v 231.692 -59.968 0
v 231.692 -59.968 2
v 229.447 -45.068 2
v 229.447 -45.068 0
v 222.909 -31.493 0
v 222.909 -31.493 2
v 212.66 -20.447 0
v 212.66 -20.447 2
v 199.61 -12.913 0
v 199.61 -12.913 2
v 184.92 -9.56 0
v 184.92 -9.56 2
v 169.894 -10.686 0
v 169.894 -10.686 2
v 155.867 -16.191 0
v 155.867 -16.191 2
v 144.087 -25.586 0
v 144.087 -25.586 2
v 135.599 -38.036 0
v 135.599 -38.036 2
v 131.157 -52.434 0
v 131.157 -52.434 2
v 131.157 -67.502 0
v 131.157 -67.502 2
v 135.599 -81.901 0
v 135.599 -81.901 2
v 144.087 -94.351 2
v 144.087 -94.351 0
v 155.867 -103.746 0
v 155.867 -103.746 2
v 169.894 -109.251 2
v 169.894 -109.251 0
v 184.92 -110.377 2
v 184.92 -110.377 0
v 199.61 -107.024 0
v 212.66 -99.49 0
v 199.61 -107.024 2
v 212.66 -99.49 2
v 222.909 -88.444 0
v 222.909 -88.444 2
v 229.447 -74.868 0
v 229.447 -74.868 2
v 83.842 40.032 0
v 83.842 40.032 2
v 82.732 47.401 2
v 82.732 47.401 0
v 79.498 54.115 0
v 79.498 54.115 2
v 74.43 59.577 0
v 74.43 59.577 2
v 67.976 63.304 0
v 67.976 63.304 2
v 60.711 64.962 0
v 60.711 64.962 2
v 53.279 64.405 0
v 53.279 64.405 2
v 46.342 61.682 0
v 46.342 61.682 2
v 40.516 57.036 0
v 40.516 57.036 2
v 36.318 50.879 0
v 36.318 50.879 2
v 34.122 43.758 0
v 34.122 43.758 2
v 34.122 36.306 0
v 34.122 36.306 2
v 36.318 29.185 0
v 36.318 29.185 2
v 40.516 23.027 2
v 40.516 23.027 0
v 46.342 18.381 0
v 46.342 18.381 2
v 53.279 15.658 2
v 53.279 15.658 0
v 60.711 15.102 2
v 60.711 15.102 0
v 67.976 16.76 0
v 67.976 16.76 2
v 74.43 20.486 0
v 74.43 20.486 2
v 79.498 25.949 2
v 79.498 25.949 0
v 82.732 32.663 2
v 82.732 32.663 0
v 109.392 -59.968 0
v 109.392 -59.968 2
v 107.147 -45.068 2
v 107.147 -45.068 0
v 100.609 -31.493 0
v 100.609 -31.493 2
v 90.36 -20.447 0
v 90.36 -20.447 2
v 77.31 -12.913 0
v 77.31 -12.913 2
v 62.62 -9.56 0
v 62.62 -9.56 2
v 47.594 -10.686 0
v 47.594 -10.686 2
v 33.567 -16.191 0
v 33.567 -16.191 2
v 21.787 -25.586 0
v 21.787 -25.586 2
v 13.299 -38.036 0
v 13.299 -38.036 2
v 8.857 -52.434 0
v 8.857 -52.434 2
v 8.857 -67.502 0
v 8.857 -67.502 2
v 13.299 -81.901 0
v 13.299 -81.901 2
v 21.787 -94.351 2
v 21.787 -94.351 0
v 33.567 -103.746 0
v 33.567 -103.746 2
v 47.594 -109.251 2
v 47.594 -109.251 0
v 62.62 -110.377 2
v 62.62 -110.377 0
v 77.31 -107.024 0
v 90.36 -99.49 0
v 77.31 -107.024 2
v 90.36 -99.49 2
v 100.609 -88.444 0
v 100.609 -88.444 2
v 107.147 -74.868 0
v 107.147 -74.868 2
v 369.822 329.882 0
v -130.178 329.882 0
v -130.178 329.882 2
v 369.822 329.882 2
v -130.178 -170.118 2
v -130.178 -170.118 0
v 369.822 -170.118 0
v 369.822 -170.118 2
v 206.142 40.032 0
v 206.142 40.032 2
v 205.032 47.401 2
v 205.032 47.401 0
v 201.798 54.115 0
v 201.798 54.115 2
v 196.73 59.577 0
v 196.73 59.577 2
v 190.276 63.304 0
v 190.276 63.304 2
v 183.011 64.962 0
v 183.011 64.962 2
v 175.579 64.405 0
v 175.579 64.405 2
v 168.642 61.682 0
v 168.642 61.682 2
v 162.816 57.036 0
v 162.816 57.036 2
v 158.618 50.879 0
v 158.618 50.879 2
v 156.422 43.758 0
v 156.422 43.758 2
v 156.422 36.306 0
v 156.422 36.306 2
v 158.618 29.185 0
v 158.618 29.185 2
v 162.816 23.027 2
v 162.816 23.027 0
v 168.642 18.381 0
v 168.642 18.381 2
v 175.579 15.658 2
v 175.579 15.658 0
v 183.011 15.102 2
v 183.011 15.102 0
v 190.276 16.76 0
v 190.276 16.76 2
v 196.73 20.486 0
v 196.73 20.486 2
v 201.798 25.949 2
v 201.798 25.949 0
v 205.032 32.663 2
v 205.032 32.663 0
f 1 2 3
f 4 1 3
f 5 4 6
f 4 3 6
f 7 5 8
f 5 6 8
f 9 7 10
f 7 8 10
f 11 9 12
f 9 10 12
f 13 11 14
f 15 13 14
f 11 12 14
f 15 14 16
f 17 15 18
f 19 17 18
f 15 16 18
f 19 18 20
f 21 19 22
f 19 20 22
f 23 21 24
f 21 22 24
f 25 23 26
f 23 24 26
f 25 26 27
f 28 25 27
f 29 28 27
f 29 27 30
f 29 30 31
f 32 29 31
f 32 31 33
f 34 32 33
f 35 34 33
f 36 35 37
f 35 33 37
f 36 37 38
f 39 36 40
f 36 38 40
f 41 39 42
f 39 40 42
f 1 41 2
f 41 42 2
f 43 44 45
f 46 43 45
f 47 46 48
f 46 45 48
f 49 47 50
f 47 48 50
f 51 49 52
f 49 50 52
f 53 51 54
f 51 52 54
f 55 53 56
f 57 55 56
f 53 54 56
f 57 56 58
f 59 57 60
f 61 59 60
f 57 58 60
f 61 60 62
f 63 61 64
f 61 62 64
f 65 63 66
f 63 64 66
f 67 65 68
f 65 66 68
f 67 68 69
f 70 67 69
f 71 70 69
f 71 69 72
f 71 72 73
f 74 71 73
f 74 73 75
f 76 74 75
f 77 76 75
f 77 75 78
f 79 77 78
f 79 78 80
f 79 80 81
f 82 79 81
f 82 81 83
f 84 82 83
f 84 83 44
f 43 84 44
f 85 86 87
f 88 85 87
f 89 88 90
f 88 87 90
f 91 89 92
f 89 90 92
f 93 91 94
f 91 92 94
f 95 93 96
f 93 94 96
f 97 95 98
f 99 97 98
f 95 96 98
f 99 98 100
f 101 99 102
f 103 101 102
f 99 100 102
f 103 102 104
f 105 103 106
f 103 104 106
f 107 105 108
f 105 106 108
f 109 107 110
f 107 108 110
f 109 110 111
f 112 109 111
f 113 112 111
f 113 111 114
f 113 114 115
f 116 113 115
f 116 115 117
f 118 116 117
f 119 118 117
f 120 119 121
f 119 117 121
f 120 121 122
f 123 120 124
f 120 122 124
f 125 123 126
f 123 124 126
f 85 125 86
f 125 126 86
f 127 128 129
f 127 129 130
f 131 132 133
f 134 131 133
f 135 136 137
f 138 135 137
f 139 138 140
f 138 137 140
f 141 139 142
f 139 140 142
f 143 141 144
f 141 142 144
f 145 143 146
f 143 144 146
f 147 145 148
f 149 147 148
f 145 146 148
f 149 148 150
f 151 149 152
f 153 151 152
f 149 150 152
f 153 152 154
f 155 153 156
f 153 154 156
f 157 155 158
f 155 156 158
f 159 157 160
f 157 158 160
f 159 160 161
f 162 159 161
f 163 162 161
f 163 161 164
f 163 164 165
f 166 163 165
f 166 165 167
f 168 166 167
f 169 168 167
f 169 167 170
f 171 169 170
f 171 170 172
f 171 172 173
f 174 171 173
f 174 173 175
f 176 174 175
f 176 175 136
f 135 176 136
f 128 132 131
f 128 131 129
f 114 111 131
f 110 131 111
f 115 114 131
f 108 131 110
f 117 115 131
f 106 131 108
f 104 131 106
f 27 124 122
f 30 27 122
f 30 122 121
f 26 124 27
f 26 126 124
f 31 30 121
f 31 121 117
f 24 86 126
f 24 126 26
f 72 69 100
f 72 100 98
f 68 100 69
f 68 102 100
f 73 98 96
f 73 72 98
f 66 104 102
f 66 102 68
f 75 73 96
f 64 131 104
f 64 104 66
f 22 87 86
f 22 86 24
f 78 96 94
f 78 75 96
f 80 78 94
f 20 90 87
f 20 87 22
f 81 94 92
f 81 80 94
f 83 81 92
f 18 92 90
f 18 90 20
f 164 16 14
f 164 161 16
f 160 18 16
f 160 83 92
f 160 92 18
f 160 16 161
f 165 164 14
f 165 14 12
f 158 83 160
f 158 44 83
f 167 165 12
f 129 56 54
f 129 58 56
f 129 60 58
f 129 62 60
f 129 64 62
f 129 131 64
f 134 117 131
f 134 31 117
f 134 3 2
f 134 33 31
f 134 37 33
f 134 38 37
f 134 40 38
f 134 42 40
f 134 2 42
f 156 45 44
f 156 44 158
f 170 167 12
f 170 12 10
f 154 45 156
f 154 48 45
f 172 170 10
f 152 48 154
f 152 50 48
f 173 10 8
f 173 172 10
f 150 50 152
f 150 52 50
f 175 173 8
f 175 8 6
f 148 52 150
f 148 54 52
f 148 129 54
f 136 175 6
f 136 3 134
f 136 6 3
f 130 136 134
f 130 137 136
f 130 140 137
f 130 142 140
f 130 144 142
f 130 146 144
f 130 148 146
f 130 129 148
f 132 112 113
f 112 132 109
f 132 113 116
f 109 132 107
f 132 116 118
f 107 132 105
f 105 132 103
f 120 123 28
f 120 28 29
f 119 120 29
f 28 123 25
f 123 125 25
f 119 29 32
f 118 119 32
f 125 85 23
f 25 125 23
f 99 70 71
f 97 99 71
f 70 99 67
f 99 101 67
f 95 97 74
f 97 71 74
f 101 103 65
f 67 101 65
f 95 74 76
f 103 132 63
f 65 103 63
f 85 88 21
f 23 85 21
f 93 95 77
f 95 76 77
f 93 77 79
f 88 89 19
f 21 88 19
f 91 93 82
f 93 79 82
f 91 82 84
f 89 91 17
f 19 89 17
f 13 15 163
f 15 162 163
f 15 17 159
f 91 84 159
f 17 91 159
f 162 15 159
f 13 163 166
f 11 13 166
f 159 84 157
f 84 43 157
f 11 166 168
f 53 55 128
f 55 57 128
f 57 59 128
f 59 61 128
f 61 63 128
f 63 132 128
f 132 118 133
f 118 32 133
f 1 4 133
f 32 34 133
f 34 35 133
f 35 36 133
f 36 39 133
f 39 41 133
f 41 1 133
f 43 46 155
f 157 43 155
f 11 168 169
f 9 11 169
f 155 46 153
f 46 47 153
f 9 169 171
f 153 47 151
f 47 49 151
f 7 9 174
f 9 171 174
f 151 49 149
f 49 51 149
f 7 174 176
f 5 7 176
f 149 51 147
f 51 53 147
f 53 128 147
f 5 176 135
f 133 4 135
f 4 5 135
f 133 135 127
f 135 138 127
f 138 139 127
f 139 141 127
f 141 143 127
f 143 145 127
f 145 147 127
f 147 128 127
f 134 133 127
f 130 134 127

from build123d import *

# Parameters (mm, degrees)
SKETCH2_W           = 500
SKETCH2_H           = 500
BOSS_EXTRUDE2_DEPTH = 2
SKETCH5_R           = 50.55
CUT_EXTRUDE1_DEPTH  = 2
SKETCH6_R           = 25
CUT_EXTRUDE2_DEPTH  = 10


with BuildPart() as part:
    # Sketch2 → Boss-Extrude2 (new body)
    with BuildSketch(Plane.XY):
        with Locations((119.822485207, 79.881656805)):
            Rectangle(SKETCH2_W, SKETCH2_H)
    extrude(amount=BOSS_EXTRUDE2_DEPTH)

    # Sketch5 → Cut-Extrude1 (cut)
    with BuildSketch(Plane.XY.offset(2)):
        with Locations((58.842485207, -59.968343195)):
            Circle(SKETCH5_R)
        with Locations((181.142485207, -59.968343195)):
            Circle(SKETCH5_R)
    extrude(amount=-CUT_EXTRUDE1_DEPTH, mode=Mode.SUBTRACT)

    # Sketch6 → Cut-Extrude2 (cut)
    with BuildSketch(Plane.XY.offset(2)):
        with Locations((181.142485207, 40.031656805)):
            Circle(SKETCH6_R)
        with Locations((58.842485207, 40.031656805)):
            Circle(SKETCH6_R)
    extrude(amount=-CUT_EXTRUDE2_DEPTH, mode=Mode.SUBTRACT)


solid = part.part
